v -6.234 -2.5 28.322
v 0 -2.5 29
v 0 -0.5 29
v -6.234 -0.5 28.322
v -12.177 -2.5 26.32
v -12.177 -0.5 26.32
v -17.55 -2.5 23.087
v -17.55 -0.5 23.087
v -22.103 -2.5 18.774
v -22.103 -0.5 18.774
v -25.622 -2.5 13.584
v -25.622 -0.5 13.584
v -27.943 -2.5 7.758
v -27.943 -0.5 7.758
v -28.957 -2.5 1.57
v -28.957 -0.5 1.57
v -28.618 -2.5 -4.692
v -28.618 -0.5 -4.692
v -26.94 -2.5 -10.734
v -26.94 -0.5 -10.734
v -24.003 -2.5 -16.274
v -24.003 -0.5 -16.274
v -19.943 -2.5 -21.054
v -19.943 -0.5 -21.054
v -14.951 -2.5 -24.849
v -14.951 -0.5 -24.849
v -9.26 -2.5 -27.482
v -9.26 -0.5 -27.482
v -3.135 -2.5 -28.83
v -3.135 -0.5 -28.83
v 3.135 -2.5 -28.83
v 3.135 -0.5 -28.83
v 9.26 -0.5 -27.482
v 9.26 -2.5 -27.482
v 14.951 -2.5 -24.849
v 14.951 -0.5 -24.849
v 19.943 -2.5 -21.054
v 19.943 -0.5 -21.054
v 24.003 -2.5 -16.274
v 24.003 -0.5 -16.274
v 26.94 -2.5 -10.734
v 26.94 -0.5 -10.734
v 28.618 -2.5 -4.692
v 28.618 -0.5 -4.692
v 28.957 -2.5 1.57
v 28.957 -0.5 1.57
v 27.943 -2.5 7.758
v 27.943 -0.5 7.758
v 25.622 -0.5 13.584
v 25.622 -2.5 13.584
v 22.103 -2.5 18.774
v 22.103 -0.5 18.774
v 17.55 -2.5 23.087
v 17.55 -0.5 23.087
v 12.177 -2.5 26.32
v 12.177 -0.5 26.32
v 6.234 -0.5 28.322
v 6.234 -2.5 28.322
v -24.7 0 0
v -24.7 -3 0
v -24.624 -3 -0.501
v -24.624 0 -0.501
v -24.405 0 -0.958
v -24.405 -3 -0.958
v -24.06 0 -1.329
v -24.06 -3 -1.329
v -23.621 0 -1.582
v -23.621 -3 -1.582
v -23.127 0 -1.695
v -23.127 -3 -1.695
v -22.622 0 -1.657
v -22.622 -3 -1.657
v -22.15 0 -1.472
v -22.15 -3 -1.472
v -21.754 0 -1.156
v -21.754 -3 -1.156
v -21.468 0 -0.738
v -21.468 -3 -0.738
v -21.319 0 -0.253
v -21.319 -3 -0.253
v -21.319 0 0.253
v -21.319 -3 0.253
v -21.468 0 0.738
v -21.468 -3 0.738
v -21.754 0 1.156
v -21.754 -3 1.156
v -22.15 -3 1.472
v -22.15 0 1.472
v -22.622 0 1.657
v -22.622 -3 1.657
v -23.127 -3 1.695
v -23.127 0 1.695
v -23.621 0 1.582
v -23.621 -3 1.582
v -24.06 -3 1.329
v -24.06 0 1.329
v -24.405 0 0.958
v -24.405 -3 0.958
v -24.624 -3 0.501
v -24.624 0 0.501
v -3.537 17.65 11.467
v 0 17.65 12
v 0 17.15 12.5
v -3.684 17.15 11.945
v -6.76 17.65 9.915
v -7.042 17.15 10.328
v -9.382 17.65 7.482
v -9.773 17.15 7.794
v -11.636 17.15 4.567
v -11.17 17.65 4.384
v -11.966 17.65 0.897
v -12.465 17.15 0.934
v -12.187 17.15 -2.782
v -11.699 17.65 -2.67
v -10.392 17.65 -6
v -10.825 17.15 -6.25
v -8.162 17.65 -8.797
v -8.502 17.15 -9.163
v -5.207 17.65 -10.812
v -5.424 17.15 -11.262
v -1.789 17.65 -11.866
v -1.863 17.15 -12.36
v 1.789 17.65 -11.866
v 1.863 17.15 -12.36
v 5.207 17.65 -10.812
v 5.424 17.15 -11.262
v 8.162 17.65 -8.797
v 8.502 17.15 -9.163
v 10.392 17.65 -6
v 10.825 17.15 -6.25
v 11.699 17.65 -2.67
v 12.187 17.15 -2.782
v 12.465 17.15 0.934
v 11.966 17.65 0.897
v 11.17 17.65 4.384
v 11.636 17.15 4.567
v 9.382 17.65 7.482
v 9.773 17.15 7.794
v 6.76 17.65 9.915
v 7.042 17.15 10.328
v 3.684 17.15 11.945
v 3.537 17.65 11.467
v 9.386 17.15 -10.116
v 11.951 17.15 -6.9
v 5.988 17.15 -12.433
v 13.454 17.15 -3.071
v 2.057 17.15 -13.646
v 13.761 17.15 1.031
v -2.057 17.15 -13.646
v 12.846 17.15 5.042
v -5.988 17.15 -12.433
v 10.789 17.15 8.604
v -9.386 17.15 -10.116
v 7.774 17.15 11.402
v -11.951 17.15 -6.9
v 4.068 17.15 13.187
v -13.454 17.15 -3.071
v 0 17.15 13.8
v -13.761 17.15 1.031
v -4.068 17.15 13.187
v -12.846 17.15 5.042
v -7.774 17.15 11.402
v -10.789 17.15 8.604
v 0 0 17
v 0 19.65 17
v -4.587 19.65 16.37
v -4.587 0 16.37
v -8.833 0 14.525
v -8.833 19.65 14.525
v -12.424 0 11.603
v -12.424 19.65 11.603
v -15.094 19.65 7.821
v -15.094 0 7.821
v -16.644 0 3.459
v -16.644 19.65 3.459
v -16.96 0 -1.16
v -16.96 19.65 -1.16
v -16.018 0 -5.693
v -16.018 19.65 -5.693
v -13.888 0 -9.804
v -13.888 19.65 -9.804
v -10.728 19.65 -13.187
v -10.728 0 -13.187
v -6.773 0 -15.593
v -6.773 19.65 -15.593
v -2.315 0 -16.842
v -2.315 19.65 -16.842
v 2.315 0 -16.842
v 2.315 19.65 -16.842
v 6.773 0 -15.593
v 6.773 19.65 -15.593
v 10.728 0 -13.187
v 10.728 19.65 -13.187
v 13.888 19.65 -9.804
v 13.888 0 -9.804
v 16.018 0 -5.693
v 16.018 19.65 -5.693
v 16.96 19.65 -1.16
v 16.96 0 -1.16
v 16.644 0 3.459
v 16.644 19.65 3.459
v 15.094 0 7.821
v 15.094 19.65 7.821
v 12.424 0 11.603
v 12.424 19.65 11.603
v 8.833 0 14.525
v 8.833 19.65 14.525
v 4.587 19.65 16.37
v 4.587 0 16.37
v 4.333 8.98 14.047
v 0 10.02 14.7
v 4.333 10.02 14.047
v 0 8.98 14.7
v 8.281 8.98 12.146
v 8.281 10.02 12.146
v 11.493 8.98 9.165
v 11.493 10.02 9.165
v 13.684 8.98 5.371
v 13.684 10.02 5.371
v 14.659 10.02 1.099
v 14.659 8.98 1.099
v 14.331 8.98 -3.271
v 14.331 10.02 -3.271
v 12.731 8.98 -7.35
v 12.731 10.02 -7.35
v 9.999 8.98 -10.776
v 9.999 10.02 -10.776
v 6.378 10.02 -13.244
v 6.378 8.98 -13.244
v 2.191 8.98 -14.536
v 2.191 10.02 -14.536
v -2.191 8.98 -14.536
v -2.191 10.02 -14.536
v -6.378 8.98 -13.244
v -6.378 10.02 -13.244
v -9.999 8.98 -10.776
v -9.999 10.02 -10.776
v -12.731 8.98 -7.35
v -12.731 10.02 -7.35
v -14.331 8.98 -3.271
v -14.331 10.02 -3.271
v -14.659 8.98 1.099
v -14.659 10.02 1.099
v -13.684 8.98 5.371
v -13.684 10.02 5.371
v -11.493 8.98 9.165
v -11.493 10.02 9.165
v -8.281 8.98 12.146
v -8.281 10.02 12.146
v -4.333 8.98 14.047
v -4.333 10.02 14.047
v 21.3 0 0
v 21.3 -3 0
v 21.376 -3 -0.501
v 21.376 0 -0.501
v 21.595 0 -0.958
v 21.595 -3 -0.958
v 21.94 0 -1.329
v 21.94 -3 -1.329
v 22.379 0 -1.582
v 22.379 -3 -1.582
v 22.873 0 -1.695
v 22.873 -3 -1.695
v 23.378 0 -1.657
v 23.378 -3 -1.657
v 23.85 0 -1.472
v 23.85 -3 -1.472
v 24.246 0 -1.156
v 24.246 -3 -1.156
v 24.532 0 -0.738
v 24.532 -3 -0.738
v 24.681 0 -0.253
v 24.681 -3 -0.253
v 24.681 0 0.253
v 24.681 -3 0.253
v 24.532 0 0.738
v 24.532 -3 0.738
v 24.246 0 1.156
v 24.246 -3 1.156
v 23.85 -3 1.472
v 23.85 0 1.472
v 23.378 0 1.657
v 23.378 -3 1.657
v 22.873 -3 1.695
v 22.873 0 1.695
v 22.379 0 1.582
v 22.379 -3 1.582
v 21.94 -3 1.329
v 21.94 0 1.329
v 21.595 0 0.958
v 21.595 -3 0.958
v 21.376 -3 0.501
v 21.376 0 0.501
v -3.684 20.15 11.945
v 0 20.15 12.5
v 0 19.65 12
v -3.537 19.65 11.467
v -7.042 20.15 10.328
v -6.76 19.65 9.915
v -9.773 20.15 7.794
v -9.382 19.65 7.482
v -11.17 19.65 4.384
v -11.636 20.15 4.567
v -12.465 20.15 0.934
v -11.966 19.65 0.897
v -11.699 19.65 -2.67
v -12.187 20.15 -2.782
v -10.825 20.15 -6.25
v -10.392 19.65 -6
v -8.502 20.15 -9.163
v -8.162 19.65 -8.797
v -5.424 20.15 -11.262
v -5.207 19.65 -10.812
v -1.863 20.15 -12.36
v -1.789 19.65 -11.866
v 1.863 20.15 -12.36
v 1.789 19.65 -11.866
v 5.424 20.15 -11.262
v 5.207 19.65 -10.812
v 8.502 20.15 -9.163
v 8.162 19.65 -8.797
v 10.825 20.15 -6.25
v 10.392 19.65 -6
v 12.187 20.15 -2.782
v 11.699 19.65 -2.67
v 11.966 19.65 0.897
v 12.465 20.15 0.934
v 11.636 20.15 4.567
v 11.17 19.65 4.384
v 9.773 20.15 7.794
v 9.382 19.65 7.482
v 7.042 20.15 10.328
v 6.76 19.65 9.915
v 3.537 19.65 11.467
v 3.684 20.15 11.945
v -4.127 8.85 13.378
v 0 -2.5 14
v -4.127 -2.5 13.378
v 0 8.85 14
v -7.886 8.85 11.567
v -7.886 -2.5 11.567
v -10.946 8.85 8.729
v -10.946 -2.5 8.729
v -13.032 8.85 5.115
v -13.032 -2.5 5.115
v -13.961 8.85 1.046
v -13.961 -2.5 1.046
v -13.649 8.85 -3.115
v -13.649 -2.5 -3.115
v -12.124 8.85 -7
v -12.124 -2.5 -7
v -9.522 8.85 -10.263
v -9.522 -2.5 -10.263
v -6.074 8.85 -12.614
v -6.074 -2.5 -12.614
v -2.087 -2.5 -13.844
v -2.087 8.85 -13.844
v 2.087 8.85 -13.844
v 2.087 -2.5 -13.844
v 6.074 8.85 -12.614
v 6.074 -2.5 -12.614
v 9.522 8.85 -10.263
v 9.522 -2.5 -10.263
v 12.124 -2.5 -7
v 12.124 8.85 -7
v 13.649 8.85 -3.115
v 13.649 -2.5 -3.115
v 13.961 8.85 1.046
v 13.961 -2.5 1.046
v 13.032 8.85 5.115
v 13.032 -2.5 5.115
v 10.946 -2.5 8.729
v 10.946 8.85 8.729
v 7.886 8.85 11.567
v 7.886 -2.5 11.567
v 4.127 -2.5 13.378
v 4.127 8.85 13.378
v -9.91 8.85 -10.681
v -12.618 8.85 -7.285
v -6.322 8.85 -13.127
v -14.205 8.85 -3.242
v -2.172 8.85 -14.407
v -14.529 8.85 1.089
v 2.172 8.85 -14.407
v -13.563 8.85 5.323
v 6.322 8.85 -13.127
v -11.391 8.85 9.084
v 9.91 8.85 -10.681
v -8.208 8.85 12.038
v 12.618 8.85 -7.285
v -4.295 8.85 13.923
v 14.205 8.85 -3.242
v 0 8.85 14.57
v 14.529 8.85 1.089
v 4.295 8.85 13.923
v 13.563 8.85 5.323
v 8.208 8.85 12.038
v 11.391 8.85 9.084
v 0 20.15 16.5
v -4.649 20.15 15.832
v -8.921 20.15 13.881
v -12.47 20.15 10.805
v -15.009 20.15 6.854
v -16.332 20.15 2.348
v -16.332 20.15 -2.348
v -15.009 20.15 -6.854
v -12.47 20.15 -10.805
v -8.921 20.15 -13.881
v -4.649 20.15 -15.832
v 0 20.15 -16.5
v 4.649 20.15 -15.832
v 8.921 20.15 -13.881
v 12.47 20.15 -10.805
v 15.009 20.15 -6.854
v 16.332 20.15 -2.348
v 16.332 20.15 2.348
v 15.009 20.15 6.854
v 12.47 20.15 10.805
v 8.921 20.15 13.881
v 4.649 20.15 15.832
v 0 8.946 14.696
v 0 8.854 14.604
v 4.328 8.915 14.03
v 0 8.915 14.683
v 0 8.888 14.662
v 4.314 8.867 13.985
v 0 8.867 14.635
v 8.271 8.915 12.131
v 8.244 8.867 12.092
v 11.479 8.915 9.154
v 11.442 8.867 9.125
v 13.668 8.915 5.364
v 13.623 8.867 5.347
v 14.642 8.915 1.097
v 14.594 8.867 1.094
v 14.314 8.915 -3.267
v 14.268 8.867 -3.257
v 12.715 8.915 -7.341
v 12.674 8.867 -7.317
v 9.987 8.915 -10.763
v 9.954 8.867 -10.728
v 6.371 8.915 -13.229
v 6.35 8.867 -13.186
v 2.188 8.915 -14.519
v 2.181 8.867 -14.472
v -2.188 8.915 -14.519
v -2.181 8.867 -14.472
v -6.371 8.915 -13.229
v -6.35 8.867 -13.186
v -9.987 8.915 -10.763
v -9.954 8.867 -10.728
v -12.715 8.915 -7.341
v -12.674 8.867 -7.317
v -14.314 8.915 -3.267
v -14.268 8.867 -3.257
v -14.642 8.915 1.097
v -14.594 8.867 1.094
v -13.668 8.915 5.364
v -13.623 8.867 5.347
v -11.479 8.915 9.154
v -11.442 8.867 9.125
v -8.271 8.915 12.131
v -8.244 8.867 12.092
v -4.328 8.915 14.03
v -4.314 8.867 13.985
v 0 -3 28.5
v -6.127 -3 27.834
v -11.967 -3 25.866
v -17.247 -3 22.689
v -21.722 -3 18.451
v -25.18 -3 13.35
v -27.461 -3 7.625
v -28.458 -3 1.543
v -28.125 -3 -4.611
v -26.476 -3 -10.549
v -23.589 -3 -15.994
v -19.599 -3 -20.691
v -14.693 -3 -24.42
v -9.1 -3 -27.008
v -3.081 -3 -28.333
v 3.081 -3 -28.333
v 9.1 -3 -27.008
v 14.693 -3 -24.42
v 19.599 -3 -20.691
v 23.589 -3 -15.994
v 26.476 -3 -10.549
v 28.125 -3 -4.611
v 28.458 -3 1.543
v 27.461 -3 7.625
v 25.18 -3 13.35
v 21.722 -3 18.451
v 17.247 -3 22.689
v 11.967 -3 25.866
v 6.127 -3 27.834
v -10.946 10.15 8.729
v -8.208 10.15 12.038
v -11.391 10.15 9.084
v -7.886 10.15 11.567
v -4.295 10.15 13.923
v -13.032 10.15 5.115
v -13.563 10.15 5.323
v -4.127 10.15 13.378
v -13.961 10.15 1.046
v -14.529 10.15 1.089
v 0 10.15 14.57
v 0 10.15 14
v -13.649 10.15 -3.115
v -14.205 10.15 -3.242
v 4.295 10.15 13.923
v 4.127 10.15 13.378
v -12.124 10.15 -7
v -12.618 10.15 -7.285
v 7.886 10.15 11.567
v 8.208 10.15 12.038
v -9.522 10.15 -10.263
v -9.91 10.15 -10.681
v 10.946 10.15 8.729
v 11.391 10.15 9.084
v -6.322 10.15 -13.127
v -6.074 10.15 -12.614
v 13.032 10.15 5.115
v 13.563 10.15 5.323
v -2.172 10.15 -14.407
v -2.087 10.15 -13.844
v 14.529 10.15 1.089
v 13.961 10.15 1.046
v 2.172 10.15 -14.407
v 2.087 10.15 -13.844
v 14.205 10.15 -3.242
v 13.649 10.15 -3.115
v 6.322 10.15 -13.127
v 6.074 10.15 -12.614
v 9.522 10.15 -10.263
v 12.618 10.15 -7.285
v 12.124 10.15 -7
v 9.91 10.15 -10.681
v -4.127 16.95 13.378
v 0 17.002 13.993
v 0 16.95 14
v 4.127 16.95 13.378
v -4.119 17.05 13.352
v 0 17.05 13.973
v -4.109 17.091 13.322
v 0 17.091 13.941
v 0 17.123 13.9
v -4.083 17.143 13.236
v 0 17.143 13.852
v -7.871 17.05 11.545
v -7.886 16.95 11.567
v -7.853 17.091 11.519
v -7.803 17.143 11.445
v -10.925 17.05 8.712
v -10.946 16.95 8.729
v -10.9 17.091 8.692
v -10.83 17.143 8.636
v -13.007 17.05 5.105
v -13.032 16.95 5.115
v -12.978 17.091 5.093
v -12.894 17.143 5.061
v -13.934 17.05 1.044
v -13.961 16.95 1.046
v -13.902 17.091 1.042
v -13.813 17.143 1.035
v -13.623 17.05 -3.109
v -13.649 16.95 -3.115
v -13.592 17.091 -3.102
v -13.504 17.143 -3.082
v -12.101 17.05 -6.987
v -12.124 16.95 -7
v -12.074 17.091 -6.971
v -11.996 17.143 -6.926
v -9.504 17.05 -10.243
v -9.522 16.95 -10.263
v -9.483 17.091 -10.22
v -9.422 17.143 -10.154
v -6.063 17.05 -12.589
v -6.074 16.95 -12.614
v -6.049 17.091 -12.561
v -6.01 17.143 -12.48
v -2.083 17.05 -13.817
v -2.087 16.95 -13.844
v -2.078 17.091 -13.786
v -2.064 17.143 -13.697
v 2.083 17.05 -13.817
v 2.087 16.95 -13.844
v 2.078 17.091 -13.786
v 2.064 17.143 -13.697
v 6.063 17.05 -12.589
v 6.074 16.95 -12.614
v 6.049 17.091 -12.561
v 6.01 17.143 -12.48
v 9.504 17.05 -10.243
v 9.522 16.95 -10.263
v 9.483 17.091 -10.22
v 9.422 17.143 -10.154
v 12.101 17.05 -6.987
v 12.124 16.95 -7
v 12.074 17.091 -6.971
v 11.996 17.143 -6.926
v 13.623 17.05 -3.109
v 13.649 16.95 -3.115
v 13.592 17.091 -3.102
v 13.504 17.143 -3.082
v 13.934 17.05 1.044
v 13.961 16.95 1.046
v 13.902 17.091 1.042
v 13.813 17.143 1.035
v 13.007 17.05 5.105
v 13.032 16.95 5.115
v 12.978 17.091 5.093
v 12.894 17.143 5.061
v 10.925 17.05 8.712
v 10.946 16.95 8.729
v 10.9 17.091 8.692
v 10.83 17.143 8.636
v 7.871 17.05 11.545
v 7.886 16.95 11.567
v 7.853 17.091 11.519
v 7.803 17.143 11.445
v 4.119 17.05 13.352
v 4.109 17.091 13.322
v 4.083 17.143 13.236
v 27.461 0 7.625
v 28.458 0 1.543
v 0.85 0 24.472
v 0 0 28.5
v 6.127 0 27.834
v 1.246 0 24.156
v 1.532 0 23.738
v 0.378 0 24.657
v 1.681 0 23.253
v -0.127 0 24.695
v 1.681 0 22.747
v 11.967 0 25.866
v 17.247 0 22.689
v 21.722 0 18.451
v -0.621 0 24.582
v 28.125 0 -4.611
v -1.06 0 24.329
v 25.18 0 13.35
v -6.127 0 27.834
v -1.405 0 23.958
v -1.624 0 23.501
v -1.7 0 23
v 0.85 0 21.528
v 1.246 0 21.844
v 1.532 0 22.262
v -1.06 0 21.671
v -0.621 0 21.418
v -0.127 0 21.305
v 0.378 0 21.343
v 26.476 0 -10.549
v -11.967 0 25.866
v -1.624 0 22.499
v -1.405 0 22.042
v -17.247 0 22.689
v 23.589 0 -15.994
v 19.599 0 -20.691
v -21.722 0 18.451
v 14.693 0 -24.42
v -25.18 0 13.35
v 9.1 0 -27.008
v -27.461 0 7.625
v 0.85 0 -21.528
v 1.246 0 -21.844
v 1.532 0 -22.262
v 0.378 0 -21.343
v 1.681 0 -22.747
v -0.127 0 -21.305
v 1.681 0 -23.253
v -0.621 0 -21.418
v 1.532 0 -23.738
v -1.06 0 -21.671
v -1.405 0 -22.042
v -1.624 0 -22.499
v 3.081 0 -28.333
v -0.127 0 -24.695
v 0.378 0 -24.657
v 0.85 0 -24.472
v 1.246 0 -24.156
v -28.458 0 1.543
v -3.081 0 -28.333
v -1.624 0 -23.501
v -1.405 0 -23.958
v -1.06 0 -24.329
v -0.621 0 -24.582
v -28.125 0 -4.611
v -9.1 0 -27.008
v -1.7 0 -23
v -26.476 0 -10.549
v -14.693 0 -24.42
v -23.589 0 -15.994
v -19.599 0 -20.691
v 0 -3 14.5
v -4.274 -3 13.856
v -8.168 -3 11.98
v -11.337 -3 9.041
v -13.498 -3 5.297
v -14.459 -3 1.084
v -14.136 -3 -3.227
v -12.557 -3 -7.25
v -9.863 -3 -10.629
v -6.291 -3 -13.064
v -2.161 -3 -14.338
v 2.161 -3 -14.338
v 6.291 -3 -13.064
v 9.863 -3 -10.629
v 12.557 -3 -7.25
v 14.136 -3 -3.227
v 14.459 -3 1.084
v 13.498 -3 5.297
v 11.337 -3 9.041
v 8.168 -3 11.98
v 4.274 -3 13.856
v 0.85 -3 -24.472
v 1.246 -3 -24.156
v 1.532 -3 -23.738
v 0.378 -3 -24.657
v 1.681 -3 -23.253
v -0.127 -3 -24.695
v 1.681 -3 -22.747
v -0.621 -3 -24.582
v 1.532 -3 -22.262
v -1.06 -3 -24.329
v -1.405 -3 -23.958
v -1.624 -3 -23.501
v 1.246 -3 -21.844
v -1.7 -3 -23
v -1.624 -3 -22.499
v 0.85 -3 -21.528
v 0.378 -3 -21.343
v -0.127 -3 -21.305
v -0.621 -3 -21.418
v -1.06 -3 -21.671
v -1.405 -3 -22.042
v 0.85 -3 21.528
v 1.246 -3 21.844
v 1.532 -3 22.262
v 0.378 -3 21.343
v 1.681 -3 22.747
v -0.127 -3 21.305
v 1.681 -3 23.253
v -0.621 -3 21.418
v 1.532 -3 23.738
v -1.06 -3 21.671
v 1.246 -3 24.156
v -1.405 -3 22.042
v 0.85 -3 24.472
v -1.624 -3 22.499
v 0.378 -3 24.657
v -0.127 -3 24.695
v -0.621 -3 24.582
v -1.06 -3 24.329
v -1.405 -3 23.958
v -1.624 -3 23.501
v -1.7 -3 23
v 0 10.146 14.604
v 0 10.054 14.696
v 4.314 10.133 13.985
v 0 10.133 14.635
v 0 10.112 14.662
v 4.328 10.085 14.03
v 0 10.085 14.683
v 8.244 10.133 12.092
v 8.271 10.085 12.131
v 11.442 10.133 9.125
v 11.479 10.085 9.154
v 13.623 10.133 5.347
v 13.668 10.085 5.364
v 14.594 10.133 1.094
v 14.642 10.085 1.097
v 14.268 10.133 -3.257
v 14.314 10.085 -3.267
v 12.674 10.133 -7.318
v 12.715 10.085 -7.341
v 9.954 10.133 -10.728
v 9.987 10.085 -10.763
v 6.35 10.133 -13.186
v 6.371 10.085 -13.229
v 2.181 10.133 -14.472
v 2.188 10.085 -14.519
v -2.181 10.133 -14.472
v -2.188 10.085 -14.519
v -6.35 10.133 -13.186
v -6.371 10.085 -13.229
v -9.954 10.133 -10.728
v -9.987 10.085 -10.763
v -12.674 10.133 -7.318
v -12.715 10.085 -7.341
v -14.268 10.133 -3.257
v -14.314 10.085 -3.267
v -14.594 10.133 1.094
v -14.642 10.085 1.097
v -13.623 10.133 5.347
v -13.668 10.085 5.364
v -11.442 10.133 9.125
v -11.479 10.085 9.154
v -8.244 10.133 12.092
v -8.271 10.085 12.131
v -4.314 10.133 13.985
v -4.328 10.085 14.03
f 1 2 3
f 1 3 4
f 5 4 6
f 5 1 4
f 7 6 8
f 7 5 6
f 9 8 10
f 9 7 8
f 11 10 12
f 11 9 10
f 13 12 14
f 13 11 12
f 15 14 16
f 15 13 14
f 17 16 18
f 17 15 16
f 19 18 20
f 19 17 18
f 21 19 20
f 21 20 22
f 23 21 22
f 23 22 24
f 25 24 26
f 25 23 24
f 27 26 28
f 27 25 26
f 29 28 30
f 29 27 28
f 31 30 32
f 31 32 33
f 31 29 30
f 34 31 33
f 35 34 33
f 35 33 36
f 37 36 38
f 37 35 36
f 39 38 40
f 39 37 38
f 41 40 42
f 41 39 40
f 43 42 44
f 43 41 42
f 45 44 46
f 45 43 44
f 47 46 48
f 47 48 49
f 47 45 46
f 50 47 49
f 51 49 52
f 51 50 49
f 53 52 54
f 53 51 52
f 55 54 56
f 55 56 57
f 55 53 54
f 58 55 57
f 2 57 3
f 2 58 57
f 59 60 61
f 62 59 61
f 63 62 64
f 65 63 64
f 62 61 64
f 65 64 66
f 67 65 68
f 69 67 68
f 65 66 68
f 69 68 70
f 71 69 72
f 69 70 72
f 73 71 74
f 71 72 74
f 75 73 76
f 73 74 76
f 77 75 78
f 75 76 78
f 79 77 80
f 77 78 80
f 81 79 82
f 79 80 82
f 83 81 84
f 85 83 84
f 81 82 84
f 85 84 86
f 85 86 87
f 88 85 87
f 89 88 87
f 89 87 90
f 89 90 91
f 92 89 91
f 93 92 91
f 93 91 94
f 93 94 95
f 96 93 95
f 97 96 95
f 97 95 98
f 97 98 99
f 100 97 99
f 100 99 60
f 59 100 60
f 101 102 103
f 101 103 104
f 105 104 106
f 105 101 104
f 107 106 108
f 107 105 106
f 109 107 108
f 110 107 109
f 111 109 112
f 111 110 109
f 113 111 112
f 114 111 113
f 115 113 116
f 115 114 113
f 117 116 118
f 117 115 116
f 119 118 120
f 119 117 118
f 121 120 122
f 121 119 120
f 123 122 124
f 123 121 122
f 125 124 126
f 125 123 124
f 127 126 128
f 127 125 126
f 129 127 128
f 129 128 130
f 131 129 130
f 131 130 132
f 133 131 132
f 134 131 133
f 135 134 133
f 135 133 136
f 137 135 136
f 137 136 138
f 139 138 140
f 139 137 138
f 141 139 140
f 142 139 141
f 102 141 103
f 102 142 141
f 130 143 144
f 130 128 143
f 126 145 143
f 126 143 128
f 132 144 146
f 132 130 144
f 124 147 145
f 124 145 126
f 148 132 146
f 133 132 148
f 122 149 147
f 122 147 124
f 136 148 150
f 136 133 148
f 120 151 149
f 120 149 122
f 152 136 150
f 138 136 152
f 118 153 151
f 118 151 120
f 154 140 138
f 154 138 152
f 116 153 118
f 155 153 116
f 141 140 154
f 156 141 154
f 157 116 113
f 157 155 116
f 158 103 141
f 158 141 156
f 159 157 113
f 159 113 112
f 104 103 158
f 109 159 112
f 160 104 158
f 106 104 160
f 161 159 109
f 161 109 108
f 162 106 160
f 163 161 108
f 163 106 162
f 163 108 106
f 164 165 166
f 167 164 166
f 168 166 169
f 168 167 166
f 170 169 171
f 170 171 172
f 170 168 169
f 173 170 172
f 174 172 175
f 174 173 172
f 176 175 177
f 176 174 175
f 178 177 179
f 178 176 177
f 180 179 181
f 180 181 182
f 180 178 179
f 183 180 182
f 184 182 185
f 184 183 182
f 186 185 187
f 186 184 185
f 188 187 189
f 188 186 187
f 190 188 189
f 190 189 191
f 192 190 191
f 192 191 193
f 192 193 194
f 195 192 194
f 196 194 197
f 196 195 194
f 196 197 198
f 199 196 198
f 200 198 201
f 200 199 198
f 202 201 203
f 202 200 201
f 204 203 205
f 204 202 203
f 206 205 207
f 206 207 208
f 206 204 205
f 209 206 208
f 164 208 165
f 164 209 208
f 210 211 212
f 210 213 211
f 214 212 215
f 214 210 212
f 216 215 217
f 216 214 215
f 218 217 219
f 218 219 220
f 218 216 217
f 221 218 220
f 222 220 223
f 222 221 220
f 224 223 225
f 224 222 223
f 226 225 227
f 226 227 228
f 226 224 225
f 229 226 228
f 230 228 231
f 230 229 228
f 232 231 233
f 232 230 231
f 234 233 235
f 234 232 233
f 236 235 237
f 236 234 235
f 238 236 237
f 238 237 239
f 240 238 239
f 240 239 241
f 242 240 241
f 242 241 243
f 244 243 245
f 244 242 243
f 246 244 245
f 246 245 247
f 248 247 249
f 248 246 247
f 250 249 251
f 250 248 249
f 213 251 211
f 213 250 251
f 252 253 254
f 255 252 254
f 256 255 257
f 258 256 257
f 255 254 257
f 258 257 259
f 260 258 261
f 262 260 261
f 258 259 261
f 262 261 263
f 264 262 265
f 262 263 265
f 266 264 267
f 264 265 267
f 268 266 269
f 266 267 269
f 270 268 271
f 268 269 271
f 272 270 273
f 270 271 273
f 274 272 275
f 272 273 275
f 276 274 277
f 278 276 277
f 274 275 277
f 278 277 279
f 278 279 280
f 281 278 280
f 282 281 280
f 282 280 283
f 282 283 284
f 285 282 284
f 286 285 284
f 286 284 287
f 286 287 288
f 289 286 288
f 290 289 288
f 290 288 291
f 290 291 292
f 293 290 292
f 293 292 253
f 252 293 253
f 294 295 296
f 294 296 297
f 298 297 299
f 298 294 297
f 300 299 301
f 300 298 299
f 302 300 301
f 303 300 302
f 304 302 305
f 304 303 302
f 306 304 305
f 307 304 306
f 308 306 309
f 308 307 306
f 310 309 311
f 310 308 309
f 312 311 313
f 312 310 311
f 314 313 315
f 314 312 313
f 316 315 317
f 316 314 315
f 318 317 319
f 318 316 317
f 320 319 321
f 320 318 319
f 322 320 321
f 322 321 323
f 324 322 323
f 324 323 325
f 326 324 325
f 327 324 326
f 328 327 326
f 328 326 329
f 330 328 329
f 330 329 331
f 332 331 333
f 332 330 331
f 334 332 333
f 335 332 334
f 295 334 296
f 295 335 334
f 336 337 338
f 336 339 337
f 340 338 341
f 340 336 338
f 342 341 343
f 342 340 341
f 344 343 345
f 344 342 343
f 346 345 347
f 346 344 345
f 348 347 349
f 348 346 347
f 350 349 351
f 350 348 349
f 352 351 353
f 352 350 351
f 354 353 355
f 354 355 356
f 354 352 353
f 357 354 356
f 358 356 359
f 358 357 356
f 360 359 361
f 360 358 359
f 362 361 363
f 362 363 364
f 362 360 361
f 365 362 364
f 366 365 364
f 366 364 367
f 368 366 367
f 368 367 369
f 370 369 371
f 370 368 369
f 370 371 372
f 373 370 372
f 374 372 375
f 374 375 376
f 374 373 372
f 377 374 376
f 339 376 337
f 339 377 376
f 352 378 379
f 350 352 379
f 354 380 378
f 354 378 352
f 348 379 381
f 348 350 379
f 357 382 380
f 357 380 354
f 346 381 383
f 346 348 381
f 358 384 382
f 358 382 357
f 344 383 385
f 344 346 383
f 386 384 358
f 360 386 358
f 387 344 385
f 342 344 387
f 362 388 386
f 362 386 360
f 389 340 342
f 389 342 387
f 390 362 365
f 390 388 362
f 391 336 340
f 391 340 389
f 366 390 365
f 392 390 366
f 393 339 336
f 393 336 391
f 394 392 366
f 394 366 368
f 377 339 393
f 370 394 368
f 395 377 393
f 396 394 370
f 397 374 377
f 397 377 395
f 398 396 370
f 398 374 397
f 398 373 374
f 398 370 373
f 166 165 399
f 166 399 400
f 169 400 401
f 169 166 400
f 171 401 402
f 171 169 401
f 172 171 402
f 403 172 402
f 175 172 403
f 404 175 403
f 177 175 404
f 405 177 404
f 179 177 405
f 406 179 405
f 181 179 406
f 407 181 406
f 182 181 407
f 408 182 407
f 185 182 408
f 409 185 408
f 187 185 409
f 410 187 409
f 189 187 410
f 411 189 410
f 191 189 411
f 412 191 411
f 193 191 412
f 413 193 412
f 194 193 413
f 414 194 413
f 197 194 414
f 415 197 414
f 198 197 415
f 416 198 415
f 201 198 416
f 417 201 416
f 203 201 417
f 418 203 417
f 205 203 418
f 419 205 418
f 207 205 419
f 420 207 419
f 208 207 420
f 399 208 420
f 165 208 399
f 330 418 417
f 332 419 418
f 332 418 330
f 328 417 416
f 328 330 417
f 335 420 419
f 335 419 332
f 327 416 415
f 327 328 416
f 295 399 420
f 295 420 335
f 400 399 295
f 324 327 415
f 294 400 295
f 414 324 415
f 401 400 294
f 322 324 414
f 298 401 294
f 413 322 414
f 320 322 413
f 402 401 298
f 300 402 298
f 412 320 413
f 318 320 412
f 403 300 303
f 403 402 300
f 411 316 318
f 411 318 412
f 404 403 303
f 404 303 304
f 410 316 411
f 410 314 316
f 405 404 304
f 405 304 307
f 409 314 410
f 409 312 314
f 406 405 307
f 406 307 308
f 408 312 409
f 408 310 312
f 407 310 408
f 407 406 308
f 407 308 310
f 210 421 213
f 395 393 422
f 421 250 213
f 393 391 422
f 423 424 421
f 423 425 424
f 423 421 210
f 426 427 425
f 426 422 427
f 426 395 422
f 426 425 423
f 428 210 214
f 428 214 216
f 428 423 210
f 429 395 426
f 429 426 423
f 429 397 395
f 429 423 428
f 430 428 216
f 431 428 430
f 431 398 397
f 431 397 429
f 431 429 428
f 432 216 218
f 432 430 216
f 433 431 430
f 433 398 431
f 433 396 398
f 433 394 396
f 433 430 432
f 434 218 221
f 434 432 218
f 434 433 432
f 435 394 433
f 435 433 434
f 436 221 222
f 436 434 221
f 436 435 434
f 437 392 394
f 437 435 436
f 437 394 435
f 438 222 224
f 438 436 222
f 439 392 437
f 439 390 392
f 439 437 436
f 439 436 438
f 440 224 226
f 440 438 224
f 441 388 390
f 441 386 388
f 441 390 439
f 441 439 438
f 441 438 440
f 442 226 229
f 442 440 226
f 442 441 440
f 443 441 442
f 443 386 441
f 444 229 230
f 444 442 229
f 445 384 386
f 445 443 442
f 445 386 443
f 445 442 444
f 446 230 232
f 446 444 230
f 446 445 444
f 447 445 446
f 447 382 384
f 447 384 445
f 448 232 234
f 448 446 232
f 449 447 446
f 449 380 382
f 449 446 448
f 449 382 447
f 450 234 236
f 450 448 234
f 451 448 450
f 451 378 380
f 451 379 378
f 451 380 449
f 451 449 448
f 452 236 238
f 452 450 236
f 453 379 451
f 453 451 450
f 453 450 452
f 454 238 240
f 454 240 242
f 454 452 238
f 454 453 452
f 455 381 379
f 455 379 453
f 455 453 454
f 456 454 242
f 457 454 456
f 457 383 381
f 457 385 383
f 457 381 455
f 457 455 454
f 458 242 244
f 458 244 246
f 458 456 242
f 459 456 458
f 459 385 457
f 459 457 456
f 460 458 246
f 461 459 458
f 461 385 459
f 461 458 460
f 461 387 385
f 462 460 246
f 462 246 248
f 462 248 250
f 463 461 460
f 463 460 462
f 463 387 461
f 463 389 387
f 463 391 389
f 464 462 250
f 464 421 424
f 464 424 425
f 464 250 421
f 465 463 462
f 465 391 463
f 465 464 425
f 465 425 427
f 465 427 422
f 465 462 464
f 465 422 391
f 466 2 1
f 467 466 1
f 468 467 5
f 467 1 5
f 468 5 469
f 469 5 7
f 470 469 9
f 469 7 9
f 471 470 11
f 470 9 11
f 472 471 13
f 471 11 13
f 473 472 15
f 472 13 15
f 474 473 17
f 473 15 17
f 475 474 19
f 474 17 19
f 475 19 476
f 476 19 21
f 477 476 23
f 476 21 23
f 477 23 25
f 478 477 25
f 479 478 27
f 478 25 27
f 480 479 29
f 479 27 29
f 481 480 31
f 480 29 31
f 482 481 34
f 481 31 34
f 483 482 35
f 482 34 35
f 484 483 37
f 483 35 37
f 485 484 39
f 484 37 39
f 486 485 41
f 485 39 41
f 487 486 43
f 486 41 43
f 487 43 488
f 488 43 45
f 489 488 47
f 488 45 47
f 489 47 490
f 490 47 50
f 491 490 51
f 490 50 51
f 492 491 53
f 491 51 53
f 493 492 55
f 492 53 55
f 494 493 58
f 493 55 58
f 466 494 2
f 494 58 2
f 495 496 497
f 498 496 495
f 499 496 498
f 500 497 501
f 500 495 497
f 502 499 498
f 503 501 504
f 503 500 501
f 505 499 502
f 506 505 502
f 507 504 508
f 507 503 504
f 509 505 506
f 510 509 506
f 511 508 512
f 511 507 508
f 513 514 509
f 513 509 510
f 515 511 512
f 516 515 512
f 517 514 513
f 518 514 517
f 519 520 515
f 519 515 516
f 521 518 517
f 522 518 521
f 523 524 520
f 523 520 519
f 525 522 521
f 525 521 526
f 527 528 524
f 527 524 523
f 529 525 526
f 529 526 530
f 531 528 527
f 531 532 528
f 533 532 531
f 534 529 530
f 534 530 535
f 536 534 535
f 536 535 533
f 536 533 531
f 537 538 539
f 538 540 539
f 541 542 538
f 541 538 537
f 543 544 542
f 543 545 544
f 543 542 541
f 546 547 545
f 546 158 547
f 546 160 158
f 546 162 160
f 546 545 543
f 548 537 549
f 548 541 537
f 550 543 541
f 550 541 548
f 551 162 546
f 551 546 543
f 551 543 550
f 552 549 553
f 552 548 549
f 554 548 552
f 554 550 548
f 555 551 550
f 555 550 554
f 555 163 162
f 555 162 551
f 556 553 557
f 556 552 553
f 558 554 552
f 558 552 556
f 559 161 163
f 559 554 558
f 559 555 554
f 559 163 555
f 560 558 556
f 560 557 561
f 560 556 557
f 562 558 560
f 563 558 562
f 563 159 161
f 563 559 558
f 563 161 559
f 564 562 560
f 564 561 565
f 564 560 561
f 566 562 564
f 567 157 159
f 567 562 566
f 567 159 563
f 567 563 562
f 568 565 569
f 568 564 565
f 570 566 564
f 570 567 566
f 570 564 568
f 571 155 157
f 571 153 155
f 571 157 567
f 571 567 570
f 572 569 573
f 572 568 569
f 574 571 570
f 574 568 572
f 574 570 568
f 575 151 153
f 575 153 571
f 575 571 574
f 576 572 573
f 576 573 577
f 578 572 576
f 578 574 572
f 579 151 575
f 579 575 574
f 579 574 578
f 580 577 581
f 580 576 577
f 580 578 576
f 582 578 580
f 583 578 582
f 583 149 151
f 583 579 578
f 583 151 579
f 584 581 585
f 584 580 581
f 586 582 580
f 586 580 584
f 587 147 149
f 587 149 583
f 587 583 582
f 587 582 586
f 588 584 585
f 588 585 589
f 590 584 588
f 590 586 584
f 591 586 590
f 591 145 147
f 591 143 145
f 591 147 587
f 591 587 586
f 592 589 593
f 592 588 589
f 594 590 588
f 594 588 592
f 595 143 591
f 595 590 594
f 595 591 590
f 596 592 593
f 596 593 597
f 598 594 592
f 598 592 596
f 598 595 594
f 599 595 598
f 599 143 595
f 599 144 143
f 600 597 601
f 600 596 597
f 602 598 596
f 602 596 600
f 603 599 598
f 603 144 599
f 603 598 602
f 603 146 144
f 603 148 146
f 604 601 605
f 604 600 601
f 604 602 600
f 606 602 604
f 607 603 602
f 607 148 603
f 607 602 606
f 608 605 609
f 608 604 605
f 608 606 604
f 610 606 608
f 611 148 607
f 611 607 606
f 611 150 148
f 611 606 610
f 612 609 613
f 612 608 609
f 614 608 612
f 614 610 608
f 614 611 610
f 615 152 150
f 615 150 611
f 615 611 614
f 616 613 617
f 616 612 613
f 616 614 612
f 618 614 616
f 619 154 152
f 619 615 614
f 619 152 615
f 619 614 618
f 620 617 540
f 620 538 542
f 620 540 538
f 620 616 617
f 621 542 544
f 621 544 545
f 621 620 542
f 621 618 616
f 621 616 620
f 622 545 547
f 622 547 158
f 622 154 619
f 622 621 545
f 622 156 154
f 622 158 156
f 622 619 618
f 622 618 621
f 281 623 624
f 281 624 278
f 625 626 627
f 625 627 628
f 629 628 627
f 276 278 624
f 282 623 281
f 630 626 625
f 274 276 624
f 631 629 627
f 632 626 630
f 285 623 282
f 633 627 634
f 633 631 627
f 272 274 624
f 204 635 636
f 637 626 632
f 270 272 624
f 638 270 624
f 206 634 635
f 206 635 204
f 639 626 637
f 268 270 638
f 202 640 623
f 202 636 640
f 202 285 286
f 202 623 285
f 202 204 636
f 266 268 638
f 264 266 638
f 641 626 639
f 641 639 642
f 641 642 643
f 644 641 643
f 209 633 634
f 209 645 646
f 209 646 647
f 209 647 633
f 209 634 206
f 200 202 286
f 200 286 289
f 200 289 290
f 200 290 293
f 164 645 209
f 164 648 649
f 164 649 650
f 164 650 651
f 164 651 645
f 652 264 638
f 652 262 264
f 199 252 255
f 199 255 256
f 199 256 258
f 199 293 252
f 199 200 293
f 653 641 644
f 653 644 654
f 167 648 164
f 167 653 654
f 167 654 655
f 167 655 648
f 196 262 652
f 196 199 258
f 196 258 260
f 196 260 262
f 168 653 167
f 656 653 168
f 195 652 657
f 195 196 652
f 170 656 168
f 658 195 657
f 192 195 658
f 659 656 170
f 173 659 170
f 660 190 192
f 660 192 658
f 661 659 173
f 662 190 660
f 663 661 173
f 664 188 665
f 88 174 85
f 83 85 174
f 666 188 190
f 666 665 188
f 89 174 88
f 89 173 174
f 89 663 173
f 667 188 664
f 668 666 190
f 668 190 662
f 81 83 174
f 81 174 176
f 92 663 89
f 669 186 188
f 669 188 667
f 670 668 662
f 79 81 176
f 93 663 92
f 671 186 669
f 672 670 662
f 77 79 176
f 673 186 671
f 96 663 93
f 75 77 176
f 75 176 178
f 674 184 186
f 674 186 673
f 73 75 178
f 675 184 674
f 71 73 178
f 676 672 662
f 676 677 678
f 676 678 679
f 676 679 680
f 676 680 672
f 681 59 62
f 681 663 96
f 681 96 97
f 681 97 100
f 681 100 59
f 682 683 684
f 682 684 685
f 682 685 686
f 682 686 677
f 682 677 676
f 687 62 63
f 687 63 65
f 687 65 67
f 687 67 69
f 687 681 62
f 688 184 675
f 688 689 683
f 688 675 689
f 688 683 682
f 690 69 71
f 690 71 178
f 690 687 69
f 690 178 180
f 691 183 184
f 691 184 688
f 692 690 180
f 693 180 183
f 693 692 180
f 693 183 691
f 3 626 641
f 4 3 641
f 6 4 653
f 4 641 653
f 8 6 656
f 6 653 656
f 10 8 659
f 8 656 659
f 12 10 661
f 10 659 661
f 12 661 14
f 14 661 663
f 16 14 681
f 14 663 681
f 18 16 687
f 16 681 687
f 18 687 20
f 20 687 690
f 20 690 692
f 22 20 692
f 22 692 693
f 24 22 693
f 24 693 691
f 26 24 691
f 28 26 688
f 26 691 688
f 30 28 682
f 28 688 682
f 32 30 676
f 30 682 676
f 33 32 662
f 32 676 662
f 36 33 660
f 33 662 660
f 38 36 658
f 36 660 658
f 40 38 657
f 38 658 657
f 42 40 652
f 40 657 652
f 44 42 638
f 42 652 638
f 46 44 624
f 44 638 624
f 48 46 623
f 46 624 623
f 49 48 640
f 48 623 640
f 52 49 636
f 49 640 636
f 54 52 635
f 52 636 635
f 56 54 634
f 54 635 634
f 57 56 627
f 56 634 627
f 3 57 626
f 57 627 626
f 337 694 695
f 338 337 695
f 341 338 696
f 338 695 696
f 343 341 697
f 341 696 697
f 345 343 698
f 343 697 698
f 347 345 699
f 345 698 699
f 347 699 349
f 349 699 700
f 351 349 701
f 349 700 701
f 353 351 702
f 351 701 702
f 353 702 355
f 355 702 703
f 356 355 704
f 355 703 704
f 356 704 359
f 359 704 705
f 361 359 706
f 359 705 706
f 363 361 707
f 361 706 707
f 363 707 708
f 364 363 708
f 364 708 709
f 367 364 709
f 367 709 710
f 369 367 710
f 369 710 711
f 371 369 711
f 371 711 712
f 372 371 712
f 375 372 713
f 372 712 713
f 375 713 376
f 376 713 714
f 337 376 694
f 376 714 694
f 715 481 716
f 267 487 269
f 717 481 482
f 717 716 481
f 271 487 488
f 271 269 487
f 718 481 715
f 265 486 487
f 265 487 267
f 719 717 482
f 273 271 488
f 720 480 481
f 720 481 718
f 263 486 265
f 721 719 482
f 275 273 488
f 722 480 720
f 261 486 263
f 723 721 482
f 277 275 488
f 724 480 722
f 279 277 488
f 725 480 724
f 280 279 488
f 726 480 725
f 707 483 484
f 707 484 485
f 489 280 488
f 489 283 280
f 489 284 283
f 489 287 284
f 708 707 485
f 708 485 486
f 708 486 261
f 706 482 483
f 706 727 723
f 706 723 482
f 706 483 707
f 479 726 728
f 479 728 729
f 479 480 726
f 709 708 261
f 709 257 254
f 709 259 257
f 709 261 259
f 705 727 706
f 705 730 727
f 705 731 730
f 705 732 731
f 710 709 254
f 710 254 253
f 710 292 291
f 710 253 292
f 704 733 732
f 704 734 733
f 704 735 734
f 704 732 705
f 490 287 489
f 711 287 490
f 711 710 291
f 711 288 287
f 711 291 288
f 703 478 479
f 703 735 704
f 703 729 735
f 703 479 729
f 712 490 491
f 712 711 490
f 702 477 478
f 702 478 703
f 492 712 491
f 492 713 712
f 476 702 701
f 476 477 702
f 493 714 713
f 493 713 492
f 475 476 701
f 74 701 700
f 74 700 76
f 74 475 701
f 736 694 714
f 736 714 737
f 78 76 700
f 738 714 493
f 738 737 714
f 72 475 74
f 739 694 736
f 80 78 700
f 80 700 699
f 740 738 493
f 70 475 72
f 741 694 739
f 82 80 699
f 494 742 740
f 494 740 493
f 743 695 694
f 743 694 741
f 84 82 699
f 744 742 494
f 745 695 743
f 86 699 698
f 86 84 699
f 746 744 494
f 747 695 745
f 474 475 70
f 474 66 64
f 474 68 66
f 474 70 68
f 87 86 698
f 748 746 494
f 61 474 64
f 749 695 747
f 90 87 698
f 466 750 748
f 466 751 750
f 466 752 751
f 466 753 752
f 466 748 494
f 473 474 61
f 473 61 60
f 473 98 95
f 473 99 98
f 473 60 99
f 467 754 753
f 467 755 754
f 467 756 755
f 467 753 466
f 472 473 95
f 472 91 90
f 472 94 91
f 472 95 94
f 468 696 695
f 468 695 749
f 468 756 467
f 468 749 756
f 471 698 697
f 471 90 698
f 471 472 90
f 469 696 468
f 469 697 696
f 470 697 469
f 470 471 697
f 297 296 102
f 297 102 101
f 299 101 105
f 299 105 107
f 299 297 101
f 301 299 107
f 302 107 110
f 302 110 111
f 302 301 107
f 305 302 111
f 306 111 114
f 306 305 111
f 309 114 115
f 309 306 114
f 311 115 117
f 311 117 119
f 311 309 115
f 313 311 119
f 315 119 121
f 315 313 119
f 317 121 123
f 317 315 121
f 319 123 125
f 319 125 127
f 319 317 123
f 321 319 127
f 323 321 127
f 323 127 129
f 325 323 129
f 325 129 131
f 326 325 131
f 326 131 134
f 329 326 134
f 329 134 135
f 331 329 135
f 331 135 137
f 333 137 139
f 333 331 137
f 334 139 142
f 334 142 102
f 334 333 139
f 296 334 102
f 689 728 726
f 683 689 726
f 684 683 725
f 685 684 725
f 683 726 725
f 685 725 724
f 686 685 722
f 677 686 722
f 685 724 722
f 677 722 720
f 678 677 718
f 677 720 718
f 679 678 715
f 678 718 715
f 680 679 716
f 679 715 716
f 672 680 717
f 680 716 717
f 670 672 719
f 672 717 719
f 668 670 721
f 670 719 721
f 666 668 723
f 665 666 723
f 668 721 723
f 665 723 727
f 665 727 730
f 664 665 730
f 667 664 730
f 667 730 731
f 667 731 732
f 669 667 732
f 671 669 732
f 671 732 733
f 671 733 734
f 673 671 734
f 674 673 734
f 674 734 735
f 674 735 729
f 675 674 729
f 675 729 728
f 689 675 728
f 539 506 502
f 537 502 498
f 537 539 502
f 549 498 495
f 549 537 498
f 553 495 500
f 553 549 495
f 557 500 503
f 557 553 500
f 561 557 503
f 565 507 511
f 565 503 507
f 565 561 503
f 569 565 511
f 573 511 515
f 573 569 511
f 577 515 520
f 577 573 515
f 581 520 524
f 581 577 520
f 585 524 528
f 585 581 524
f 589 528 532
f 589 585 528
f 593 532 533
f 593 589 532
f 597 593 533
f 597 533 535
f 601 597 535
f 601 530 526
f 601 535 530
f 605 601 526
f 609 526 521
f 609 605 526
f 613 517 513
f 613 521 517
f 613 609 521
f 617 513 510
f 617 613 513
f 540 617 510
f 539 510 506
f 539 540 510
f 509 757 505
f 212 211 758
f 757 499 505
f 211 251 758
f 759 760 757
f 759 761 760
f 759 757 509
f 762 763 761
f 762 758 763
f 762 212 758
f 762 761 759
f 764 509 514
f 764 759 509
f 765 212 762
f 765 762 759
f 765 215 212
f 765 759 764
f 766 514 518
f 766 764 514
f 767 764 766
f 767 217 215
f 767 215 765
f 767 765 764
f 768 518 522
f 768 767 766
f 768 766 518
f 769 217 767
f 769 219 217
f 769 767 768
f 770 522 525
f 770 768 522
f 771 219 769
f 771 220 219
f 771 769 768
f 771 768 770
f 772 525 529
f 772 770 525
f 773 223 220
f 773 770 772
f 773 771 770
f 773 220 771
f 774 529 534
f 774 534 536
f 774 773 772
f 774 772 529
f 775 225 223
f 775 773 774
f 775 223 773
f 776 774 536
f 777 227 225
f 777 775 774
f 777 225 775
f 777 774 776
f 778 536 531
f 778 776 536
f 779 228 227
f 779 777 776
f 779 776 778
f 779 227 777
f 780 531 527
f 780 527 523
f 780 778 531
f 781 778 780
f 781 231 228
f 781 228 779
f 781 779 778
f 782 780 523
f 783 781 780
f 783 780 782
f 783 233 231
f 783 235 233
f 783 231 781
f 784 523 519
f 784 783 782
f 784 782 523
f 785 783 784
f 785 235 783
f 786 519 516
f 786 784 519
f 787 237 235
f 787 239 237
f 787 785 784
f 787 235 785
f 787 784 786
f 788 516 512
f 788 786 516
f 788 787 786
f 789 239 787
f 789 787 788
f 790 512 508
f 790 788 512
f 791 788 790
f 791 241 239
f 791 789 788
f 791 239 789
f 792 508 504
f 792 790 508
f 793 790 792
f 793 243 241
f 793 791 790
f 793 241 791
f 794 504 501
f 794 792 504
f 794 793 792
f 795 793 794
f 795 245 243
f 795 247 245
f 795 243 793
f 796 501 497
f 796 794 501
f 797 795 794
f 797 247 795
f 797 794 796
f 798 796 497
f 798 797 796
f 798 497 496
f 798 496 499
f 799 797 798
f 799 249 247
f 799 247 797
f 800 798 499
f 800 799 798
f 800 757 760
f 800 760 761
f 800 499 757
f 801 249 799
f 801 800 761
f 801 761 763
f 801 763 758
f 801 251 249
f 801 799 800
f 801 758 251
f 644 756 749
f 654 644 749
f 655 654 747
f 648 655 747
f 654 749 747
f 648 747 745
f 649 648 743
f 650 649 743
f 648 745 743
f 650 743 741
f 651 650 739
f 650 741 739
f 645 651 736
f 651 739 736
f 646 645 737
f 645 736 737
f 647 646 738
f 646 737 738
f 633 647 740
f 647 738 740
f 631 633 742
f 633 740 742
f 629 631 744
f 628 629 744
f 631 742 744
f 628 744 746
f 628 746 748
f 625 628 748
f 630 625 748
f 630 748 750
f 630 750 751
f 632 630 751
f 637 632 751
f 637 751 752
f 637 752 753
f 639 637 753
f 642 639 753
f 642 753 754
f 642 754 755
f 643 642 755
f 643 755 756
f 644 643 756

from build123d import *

# Parameters (mm, degrees)
M3_CLEARANCE_HOLE1_D = 3.4
FILLET1_R            = 0.2
CHAMFER1_SIZE        = 0.5


with BuildPart() as part:
    # Sketch1 → Revolve1 (revolve)
    with BuildSketch(Plane.XY, mode=Mode.PRIVATE) as revolve1_sk:
        Polygon((14, -3), (14, 17.15), (12, 17.15), (12, 20.15), (17, 20.15), (17, 0), (29, 0), (29, -3), align=None)
    revolve(revolve1_sk.sketch.rotate(Axis((0, 17.954019247, 0), (0, -1, 0)), 90), axis=Axis((0, 17.954019247, 0), (0, -1, 0)))

    # M3 Clearance Hole1 (through all)
    with Locations(Plane(origin=(0, 0, 0), x_dir=(1, 0, 0), z_dir=(0, 1, 0))):
        with Locations((0, 23), (23, 0), (0, -23), (-23, 0)):
            Hole(M3_CLEARANCE_HOLE1_D / 2)

    # Fillet1
    fillet1_edges = [part.edges().sort_by_distance(p)[0] for p in [
        (0, 17.15, -14),
    ]]
    fillet(fillet1_edges, radius=FILLET1_R)

    # Chamfer1
    chamfer1_edges = [part.edges().sort_by_distance(p)[0] for p in [
        (0, 17.15, -12),
        (0, 20.15, -12),
        (0, 20.15, -17),
        (0, 0, -29),
        (0, -3, -29),
        (0, -3, -14),
    ]]
    chamfer(chamfer1_edges, length=CHAMFER1_SIZE)

    # Sketch8 → Groove for BS 3673 P4 - B028M, Internal Circlip1 (revolve, cut)
    with BuildSketch(Plane(origin=(0, 17.954019247, 0), x_dir=(0, 0, 1), z_dir=(-1, 0, 0))):
        with BuildLine():
            Line((14.57, -9.104019247), (12.6, -9.104019247))
            Line((12.6, -9.104019247), (12.6, -7.804019247))
            Line((12.6, -7.804019247), (14.57, -7.804019247))
            ThreePointArc((14.57, -7.804019247), (14.661923882, -7.842095365), (14.7, -7.934019247))
            Line((14.7, -7.934019247), (14.7, -8.974019247))
            ThreePointArc((14.7, -8.974019247), (14.661923882, -9.065943128), (14.57, -9.104019247))
        make_face()
    revolve(axis=Axis((0, -32.045980753, 0), (0, 1, 0)), mode=Mode.SUBTRACT)


solid = part.part
